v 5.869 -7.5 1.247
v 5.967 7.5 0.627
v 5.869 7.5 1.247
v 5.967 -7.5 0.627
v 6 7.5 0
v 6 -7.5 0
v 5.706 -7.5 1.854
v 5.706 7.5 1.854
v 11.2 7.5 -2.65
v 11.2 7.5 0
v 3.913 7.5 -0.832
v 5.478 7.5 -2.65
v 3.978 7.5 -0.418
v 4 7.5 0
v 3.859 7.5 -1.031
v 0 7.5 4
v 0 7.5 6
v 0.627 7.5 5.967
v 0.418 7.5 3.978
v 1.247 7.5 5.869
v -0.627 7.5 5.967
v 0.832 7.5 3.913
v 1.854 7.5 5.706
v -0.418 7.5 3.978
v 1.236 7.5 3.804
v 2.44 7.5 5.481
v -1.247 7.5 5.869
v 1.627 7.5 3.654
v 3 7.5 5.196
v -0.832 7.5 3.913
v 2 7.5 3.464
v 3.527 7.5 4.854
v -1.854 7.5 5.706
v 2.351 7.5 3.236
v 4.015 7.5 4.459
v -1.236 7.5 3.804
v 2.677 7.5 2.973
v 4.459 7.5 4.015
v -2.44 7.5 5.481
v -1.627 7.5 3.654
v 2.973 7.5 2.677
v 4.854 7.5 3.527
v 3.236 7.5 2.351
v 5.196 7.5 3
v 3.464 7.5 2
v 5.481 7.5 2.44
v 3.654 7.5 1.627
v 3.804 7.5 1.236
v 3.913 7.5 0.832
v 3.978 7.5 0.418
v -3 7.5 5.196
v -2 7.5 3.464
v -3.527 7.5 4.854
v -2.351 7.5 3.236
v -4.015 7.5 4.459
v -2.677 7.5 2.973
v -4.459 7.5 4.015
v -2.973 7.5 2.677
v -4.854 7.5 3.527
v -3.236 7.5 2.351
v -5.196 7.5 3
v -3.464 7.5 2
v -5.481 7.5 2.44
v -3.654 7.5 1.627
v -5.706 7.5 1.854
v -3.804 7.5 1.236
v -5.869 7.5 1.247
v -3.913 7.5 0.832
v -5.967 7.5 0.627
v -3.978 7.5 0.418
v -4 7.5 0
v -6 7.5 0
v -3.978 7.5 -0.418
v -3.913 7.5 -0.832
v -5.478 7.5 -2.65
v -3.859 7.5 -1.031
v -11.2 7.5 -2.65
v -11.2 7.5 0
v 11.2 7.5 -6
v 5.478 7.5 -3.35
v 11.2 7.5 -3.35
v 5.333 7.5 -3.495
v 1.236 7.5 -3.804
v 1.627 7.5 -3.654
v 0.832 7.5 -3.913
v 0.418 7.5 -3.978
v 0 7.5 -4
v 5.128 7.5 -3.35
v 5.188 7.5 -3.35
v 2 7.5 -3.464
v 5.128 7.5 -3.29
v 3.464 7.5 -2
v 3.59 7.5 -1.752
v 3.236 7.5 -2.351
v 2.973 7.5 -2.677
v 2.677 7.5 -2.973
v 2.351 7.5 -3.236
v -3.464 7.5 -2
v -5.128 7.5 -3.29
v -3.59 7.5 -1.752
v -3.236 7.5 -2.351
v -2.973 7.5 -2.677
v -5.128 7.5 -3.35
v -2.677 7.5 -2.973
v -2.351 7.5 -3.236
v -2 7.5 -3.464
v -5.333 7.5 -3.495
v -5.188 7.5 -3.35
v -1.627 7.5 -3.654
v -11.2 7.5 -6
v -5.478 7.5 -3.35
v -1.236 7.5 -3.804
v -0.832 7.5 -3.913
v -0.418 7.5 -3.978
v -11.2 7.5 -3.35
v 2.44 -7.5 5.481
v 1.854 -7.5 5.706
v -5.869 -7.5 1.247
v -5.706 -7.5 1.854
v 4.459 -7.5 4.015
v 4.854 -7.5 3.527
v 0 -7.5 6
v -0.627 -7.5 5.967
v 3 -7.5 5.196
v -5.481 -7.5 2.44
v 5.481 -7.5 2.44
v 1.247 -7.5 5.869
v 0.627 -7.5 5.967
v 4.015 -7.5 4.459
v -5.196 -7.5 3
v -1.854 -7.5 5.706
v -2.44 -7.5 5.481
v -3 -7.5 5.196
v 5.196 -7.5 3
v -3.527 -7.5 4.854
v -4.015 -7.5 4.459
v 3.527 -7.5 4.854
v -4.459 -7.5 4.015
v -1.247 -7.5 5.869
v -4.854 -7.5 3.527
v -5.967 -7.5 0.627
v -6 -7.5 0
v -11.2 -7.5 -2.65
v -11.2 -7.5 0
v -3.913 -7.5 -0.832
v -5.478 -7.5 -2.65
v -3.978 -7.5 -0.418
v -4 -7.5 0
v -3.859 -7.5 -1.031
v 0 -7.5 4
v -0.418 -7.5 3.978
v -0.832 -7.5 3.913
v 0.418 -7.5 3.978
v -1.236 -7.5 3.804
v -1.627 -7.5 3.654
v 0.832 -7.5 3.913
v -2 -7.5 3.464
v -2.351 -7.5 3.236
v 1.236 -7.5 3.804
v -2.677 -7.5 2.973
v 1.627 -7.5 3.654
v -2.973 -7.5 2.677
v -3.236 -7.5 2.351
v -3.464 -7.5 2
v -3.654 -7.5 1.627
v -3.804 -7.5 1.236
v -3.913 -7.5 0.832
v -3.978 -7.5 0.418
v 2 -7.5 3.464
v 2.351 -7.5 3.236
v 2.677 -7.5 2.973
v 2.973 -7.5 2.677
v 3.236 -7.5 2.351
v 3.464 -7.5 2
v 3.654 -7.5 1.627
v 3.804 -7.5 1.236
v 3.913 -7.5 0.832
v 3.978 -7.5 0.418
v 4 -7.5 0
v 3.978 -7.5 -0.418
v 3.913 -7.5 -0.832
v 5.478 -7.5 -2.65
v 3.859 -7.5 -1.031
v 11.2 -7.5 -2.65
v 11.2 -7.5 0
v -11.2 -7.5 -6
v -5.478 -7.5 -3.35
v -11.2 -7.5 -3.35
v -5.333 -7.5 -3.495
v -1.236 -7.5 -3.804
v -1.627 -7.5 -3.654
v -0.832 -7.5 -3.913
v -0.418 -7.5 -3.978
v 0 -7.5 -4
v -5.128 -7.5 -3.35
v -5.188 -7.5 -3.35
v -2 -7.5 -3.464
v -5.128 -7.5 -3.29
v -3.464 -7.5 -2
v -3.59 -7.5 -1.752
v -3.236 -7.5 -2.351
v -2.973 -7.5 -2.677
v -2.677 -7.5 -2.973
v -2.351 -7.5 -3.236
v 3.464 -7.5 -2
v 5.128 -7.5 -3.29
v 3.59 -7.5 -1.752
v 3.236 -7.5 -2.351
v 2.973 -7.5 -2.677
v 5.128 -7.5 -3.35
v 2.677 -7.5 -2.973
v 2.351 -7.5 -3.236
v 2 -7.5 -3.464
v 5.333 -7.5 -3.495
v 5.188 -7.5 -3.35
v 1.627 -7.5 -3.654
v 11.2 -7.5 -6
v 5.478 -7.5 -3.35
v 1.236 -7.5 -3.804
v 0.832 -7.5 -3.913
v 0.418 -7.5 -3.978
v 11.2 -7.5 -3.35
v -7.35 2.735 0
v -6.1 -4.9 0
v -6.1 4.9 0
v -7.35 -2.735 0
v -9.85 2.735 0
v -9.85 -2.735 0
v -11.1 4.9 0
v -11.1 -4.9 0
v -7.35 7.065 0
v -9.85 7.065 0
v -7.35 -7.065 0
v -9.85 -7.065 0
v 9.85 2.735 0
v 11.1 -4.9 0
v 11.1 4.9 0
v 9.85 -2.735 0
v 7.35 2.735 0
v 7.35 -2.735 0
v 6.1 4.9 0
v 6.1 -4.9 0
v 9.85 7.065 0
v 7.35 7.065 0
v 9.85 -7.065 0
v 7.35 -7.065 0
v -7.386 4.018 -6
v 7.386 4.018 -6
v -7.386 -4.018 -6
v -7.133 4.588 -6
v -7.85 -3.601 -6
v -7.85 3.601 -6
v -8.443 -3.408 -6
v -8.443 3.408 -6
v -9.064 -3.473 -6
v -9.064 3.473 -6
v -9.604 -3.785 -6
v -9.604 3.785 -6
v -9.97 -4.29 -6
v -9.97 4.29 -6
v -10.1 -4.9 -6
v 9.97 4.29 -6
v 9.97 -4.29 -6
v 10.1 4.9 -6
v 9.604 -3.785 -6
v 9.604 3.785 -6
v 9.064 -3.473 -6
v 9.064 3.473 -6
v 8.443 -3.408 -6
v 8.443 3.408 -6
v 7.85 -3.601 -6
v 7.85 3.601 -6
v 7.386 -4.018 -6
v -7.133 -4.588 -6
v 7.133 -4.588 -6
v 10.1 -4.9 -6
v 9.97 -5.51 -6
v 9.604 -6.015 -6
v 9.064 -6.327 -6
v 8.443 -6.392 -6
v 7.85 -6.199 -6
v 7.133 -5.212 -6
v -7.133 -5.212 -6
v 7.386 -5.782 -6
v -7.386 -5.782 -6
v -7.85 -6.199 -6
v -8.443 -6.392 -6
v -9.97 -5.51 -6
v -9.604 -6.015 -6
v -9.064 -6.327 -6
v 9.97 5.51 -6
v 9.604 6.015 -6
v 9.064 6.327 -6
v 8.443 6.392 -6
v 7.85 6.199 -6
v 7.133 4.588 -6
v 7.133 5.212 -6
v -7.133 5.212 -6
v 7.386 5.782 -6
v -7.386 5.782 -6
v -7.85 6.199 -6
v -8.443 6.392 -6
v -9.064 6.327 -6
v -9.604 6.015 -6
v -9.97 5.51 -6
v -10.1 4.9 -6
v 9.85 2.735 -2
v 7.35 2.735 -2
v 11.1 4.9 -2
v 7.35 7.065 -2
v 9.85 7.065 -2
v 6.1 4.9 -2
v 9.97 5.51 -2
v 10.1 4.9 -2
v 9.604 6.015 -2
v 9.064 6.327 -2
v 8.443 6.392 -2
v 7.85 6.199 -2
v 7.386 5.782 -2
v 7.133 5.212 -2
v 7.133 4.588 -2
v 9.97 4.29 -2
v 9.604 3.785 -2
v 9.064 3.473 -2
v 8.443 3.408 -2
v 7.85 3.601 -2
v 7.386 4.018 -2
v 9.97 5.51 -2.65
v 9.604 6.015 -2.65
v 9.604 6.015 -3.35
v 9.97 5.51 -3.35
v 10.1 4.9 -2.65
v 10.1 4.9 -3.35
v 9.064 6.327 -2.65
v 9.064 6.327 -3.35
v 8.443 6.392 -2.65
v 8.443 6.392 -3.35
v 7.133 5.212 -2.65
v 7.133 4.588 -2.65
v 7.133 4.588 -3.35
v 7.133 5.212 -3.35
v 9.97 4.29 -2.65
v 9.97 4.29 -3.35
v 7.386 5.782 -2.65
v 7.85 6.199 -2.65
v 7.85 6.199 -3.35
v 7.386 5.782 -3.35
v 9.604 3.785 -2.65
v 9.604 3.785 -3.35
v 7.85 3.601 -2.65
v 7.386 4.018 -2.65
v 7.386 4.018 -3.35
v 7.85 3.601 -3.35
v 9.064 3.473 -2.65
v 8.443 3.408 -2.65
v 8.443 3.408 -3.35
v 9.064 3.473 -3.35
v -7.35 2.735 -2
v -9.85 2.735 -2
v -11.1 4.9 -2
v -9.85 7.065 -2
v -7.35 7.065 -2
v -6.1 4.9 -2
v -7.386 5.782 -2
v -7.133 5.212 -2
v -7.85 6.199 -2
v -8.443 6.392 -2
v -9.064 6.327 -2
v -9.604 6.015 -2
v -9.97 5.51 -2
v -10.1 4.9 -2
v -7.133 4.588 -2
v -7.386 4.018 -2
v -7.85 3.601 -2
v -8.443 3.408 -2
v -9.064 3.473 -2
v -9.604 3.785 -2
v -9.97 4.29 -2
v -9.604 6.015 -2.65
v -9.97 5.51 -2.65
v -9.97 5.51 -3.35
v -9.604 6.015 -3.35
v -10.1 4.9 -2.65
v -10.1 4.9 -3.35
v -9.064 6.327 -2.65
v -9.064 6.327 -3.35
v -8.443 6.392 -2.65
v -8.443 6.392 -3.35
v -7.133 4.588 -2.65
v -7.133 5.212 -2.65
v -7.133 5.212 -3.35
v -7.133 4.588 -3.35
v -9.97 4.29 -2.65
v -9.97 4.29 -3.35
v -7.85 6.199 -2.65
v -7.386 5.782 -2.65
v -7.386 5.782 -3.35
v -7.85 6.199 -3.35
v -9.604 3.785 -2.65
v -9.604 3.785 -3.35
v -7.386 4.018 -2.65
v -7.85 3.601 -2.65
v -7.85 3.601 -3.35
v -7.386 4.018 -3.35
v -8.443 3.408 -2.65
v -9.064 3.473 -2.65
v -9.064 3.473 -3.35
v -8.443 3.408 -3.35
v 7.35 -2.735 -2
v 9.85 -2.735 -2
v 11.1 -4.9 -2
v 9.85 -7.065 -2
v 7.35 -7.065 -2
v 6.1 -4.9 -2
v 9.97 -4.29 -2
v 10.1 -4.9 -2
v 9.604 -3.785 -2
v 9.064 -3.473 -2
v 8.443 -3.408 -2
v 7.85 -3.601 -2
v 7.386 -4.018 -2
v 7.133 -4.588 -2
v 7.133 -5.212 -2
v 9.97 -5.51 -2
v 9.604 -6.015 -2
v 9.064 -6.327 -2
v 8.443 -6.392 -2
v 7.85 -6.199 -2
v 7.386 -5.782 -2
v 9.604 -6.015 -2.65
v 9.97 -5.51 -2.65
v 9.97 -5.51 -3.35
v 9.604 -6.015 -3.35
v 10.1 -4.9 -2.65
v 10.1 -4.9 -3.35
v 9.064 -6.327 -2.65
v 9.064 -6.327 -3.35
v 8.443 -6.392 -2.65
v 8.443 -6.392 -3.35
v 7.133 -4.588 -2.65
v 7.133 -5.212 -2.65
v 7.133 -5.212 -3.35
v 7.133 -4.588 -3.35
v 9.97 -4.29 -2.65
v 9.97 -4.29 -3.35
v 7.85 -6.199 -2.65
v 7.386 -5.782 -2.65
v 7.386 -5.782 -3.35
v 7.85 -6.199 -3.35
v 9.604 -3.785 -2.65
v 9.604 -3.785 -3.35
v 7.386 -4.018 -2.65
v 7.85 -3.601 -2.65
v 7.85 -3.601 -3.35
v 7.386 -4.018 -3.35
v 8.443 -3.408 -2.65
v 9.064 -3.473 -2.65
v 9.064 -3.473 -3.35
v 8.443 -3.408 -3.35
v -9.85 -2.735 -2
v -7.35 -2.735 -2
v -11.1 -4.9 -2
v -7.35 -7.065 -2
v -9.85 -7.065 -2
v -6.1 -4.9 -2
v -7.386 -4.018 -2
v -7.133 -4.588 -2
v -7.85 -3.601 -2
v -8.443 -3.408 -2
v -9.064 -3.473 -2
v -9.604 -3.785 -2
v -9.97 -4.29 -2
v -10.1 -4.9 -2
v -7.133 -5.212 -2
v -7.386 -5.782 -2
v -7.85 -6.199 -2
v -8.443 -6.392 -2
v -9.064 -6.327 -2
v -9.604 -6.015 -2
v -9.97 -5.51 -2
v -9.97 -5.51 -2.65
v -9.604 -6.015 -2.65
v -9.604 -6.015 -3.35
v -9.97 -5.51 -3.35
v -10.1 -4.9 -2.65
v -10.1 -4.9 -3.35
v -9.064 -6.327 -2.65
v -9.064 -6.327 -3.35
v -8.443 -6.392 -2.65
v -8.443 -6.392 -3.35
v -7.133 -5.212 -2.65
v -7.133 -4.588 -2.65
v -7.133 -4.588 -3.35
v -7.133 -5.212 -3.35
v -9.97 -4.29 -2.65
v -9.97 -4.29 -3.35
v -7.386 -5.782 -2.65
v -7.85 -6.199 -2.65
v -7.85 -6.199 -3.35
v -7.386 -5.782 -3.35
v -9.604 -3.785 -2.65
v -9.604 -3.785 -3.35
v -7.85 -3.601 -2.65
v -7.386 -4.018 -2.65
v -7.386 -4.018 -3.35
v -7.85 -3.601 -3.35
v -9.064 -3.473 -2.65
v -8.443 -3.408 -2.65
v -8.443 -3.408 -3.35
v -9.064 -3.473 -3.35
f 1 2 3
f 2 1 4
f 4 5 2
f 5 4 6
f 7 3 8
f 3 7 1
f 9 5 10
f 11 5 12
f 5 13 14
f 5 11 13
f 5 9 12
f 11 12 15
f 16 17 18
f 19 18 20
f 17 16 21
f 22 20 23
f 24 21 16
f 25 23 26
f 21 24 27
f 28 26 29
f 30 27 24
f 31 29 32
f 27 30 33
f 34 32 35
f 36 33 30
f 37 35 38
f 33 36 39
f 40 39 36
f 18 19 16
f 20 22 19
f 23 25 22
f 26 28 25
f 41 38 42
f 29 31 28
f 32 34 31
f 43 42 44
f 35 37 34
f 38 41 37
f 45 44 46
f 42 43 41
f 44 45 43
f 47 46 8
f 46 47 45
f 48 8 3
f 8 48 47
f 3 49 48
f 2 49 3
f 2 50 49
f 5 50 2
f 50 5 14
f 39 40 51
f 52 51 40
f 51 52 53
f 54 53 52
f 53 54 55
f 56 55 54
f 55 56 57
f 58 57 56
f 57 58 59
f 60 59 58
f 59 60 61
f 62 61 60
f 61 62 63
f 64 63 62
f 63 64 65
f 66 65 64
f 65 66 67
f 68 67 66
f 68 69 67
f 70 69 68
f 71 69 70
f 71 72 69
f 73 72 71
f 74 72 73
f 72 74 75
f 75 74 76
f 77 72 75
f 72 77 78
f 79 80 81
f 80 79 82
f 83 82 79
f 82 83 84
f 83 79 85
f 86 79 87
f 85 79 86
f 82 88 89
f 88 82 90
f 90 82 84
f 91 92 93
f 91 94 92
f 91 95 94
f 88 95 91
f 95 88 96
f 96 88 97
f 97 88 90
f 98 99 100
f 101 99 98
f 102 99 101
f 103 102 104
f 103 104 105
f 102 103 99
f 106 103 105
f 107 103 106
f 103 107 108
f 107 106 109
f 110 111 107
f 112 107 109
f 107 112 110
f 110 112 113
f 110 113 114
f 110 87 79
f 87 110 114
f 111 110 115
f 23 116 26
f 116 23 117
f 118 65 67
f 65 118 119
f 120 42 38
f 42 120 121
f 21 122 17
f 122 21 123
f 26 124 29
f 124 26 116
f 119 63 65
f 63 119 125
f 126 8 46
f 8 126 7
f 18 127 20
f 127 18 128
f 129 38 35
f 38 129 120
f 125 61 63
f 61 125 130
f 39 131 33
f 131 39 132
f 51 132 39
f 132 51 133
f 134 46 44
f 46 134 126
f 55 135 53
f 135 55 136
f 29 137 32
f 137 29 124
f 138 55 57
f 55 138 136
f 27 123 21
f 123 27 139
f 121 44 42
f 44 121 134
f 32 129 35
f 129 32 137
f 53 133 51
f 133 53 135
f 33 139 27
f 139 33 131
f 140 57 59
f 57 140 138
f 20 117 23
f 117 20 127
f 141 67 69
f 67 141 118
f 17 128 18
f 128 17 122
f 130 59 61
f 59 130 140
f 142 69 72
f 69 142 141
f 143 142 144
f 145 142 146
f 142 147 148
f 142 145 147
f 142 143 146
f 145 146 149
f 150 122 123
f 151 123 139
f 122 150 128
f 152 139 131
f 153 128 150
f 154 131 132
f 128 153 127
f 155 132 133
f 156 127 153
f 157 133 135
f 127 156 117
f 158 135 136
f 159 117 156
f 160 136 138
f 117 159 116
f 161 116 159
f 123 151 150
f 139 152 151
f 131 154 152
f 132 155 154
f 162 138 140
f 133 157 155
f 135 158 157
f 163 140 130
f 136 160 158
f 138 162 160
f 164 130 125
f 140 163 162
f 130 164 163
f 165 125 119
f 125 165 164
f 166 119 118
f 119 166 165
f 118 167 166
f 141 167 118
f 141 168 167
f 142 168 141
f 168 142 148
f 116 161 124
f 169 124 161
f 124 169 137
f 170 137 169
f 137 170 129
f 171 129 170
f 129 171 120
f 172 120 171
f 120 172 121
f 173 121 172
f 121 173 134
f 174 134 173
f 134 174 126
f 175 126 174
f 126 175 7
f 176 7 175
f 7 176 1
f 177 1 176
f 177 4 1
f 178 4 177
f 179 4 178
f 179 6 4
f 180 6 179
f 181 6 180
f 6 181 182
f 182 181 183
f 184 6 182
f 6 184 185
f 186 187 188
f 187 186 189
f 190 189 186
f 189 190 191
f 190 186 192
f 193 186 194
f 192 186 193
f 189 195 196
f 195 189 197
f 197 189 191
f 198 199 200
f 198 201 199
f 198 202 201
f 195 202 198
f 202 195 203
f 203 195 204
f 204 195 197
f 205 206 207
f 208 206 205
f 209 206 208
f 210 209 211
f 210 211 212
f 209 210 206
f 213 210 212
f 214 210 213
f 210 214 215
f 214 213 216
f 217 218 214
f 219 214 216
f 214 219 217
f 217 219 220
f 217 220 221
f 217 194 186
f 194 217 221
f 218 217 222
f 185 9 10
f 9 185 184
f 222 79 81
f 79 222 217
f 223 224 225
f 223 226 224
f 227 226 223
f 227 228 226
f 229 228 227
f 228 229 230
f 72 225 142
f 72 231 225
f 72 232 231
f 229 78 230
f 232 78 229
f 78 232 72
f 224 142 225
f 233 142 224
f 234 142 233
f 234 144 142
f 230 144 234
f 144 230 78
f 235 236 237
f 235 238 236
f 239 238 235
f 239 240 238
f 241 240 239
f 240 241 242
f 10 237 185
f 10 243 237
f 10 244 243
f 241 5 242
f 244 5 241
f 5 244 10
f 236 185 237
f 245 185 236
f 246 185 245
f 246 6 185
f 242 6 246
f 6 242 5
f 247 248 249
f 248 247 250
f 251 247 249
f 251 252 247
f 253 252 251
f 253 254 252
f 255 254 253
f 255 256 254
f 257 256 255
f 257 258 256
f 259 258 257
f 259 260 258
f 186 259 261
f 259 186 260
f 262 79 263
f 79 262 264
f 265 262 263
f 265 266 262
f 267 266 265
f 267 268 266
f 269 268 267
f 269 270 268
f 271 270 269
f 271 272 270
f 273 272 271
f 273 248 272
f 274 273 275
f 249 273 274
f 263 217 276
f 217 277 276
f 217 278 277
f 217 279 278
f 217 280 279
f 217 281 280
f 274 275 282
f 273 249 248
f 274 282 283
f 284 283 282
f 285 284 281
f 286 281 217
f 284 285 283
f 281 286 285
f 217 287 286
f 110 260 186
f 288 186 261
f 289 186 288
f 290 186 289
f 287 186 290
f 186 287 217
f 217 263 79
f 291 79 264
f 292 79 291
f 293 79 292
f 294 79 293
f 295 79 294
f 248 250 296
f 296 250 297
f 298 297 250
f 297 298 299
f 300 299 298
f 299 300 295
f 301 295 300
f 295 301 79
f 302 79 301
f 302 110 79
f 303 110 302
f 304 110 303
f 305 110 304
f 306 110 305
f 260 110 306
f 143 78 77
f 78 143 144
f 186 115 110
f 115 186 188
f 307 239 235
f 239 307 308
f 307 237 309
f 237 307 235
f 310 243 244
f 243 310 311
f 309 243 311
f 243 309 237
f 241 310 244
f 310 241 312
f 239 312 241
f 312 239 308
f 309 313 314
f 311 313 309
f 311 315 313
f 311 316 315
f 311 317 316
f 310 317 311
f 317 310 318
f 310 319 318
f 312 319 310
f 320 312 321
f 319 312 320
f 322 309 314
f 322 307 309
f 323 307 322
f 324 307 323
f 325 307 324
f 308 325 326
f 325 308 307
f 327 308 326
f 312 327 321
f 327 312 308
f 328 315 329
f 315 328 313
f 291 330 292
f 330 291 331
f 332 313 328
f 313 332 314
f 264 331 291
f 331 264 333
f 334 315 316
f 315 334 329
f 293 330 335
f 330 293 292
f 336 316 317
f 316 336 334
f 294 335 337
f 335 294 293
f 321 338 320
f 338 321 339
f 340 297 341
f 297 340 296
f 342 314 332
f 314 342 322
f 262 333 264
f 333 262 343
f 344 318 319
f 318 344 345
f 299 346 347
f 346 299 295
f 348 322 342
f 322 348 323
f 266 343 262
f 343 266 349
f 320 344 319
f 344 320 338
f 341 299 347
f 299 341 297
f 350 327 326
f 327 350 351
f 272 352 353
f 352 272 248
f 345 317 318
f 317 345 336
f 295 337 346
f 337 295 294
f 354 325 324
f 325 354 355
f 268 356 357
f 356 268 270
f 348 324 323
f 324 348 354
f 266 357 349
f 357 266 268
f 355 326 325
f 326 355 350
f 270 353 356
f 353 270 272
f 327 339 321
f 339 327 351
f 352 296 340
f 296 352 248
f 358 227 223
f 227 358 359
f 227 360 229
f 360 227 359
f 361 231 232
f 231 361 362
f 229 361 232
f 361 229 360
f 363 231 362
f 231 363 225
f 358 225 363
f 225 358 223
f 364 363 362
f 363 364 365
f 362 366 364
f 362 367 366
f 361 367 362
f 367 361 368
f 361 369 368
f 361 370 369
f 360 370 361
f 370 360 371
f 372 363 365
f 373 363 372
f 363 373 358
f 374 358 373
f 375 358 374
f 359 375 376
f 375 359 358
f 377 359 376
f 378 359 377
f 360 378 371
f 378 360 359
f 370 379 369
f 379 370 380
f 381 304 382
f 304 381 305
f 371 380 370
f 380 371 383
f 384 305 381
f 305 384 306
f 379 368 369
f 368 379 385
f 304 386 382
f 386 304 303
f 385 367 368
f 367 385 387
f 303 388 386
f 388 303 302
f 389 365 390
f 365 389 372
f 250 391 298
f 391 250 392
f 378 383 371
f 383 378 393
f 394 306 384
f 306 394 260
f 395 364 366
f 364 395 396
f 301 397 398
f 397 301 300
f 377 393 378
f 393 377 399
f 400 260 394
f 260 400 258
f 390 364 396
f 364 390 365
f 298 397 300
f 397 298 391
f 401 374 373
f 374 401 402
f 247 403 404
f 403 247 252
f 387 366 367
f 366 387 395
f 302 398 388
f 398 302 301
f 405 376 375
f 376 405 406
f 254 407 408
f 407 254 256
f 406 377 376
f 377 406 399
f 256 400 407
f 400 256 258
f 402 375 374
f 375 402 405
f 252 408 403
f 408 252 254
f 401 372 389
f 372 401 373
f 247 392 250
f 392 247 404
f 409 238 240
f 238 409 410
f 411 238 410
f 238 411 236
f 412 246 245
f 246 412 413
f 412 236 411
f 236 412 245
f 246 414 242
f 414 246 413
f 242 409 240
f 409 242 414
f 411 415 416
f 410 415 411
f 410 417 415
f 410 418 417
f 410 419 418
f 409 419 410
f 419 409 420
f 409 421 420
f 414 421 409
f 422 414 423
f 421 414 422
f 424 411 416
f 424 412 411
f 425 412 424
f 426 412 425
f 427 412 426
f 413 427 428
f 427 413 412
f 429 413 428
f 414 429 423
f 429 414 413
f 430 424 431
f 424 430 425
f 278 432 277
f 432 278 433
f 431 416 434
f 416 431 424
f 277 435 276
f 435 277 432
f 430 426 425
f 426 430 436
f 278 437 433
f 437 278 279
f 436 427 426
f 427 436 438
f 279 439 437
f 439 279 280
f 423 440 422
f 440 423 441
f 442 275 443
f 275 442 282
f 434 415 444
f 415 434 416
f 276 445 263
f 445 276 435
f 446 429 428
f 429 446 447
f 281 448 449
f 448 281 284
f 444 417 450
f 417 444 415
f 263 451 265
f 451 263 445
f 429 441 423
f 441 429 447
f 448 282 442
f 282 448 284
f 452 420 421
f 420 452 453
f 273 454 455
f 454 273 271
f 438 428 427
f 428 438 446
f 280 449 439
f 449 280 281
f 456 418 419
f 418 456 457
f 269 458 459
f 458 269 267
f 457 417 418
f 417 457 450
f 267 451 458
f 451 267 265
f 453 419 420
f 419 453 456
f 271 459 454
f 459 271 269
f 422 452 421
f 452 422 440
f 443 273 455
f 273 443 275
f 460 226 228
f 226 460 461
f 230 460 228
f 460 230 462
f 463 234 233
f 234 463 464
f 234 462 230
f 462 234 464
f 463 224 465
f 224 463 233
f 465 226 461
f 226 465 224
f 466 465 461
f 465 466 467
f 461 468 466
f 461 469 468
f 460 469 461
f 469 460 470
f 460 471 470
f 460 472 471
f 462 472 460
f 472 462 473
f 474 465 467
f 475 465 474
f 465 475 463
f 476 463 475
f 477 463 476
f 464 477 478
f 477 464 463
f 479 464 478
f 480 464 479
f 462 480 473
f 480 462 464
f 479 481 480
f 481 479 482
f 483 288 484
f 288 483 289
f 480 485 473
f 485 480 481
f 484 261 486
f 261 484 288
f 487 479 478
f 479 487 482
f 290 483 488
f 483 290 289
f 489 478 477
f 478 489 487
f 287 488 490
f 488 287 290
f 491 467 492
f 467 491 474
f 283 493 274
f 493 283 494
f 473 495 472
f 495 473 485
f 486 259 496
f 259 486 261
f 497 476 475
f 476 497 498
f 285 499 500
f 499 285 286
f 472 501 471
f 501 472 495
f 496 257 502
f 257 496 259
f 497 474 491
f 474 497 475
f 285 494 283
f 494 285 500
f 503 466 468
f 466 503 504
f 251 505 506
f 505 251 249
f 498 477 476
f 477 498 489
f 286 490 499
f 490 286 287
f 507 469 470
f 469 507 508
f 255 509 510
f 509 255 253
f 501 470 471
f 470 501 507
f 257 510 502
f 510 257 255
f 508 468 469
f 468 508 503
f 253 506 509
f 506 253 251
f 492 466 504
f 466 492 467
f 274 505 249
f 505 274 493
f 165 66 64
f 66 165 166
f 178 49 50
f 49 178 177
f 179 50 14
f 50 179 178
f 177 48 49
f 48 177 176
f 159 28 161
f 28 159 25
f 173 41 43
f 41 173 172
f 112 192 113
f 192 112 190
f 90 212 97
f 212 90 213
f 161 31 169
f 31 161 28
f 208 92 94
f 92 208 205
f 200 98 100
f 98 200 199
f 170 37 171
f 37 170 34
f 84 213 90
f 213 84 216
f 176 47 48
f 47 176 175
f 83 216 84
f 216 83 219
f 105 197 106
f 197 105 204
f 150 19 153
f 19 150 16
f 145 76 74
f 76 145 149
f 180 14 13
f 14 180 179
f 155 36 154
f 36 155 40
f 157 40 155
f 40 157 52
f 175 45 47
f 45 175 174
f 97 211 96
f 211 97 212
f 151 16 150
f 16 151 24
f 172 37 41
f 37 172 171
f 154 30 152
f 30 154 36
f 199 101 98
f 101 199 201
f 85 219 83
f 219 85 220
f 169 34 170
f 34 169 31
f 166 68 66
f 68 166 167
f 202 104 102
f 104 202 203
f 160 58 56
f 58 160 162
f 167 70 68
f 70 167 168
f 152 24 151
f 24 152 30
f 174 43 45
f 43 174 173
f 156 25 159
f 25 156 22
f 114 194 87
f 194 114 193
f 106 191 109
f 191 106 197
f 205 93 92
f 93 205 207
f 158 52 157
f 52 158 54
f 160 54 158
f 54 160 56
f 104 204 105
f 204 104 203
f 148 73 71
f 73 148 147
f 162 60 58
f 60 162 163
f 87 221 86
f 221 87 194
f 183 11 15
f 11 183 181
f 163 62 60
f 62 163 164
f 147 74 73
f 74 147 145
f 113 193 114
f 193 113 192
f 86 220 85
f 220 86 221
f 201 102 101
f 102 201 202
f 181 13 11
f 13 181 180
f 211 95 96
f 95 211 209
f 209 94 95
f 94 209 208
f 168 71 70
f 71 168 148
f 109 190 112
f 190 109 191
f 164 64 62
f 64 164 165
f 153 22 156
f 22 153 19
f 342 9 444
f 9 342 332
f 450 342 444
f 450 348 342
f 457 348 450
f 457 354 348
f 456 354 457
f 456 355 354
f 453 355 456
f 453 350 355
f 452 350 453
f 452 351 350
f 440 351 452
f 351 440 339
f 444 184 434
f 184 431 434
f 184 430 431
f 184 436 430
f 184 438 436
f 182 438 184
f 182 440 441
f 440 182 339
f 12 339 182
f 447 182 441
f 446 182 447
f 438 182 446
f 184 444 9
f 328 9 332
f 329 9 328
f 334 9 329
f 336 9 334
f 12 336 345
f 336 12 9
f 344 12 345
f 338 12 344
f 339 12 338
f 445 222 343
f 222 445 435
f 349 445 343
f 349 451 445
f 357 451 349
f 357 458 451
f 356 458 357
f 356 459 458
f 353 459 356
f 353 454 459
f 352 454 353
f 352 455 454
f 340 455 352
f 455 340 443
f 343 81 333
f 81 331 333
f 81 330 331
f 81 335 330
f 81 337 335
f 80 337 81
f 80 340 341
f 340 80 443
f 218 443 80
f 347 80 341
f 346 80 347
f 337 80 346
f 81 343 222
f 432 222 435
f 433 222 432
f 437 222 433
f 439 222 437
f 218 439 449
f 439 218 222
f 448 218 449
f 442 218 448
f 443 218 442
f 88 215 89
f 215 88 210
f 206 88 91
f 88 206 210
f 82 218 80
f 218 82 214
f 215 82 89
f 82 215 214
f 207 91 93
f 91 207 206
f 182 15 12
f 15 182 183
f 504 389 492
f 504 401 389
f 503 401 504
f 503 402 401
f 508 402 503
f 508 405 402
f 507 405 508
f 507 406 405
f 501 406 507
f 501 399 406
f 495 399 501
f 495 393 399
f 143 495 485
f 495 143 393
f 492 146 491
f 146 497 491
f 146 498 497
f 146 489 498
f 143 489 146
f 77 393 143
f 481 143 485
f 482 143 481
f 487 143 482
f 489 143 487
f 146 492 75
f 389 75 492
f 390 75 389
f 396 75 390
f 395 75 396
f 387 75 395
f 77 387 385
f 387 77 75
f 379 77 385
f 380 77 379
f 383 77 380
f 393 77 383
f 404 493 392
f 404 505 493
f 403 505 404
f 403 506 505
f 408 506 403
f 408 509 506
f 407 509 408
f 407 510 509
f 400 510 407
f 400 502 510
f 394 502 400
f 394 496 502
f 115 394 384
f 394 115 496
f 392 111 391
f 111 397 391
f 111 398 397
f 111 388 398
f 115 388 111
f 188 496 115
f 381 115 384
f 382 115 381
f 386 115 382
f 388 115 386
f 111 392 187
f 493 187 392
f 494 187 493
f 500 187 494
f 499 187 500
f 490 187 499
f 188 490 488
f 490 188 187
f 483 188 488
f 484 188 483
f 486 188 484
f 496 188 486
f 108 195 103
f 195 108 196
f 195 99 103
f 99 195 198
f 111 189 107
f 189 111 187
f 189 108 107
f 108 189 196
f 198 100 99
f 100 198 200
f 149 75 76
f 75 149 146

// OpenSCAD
p = 15;

r = 4;
b = 2;
b2 = 1.1;

f=1.5;
fh = 2.5;
c = .7;

module r(x,y,z){
	rotate([x,y,z]) child();
}

module t(x,y,z){
	translate([x,y,z]) child();
}

module f(){
$fn= 15;
t(r+b+f+b2,p/2 - f - b2,0)
union(){
t(0,0,b - 2)cylinder(r = fh, h=100, $fn=6);
cylinder(r=f, h=100, center=true);
}
}

module furos(){
f();
mirror([1,0,0]) f();

mirror([0,1,0])
union(){
	f();
	mirror([1,0,0]) f();
}
}

module spacer(){
t(r + r*sin(45) - c -1,0,0)
union(){
t(0,-(p+1)/2,-a/4 + -c/2)cube([l2/2,p+1,c], center=false);
t(c,-(p+1)/2,-a/4 + -c/2 + c/2) r(0,45 + 180,0) cube([r,p+1,c], center=false);
}
}


l = 2*r + 2*b;
a = 2*r + 2*b;
l2 = l + (b2*2 + f*2)*2;

$fn = 60;

difference(){
t(0,0,-b)
difference(){
union(){
/*
t(0,0,b)
	cube([l,p,a], center=true);
*/
t(0,0,b)
r(90,0,0)
	cylinder(r=r + b, h=p, center=true);


t(0,0,-a/4 + b)
	cube([l2,p,a/2], center=true);


}

union(){
t(0,0,b)
r(90,0,0)
	cylinder(r=r, h=p+1, center=true);
furos();
}
}

spacer();
mirror([1,0,0]) spacer();
}




//cube([l,p,a], center=true);
